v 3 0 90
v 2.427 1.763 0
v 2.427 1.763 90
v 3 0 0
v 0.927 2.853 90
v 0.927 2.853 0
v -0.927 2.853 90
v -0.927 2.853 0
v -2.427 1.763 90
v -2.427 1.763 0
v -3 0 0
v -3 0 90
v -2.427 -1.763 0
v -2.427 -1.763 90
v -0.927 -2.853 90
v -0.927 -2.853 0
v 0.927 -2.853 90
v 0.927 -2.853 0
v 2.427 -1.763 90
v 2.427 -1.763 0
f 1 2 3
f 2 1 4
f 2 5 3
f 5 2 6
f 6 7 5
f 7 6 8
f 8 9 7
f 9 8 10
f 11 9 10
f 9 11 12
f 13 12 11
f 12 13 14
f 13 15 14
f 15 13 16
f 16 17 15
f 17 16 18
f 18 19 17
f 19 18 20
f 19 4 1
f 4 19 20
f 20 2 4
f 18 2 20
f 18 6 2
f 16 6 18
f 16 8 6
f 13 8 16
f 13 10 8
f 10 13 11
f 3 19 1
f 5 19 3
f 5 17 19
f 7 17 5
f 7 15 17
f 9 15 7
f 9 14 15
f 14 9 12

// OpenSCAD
// CAD model: large_circular_pin
// === CYLINDER PARAMETERS ===
cylinder_diameter = 6;
cylinder_height = 90;

translate([0, 0, 0])
cylinder(h = cylinder_height, d = cylinder_diameter);
